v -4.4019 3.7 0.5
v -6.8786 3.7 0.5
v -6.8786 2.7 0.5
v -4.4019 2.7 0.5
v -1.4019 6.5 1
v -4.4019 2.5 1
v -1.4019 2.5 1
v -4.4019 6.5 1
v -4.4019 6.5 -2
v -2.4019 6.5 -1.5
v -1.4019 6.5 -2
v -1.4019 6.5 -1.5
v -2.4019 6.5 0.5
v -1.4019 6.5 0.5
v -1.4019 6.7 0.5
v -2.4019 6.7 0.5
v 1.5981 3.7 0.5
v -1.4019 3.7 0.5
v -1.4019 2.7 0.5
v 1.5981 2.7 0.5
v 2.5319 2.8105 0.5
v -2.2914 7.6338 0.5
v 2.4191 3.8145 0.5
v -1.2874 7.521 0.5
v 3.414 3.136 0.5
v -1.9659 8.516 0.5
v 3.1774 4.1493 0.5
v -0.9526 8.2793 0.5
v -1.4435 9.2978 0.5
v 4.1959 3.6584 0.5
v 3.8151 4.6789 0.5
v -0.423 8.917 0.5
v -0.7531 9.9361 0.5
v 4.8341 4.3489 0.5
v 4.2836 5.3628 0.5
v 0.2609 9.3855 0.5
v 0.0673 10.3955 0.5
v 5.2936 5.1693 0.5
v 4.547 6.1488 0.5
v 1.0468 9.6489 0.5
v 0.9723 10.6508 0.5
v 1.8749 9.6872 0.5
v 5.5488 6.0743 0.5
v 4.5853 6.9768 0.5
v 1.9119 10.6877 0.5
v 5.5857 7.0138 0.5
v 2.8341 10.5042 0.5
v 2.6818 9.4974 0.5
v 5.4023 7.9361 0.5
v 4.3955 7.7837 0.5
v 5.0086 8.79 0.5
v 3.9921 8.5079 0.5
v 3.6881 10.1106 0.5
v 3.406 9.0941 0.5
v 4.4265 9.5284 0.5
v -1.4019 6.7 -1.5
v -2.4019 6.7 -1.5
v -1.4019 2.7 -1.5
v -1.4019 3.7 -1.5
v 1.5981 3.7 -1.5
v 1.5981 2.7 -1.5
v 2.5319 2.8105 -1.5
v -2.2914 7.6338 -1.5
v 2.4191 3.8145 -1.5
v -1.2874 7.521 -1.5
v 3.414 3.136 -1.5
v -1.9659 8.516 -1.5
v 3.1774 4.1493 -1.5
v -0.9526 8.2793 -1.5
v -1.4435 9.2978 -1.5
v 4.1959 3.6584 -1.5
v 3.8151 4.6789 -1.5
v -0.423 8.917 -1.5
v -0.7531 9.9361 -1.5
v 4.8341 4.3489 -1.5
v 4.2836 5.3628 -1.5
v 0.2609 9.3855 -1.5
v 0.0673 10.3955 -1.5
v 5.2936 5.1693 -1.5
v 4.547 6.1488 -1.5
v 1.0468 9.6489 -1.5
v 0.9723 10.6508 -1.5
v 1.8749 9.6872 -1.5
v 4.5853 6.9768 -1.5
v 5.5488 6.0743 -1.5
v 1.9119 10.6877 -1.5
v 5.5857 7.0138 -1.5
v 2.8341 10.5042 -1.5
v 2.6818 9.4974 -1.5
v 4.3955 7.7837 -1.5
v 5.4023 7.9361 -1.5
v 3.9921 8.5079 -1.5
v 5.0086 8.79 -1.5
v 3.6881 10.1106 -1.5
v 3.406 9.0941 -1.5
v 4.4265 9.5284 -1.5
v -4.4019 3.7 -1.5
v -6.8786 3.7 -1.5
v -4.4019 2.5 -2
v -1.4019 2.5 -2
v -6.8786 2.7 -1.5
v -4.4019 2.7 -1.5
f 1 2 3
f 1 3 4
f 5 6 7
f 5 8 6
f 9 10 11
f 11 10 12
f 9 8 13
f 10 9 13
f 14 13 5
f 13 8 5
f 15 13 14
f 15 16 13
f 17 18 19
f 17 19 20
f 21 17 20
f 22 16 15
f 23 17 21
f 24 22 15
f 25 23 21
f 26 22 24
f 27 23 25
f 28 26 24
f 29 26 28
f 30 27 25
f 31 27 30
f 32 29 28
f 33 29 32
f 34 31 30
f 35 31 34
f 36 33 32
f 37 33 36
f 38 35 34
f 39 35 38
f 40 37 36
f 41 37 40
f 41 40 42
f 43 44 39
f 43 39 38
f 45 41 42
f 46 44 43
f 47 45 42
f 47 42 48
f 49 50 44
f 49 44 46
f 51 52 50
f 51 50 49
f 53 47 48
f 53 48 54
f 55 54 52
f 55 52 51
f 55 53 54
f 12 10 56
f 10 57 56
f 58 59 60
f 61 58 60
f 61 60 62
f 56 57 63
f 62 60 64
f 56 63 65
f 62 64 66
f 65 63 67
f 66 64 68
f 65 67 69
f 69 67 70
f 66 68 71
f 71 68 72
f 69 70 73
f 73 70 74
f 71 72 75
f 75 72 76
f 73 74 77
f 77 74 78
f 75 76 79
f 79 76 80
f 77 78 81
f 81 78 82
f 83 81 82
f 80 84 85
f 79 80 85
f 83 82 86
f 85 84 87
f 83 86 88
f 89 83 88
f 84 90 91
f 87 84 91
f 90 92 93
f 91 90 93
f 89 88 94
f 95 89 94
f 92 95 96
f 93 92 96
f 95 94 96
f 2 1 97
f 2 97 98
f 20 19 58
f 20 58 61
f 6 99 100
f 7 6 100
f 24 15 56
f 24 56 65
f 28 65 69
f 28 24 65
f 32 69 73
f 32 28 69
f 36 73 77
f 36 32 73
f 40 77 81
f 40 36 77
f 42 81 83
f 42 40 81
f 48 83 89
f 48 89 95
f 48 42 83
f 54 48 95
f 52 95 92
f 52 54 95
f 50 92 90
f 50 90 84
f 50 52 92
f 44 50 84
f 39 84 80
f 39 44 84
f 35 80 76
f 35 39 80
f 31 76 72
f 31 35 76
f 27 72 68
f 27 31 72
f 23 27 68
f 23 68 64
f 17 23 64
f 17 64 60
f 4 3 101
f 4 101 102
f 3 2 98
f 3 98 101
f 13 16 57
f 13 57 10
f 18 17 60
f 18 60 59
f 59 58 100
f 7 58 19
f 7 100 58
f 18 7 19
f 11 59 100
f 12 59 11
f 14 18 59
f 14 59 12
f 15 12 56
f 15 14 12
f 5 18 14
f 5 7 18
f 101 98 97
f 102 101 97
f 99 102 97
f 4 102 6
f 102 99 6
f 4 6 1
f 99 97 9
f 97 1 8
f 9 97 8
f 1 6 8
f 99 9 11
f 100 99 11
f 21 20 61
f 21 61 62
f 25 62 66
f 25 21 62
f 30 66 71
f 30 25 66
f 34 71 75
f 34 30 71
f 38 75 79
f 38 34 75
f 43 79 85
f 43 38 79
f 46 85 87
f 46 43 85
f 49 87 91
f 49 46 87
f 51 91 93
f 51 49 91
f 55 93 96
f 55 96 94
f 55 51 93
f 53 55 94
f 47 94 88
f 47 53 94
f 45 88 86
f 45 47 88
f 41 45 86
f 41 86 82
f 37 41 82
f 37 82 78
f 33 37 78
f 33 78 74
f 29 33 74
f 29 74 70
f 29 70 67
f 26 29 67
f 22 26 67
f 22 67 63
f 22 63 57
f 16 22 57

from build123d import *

# Parameters (mm, degrees)
SKETCH1_W           = 20
SKETCH1_H           = 20
EXTRUDE1_DEPTH      = 1
SKETCH2_W           = 20
SKETCH2_H           = 20
EXTRUDE2_DEPTH      = 1.5
EXTRUDE2_TAPER      = 75
SKETCH3_W           = 3
SKETCH3_H           = 4
EXTRUDE3_DEPTH      = 2
EXTRUDE_THIN1_DEPTH = 1.5
MOVE_FACE1_BY       = 1
MOVE_FACE1_2_BY     = 1
MOVE_FACE1_3_BY     = 1
SKETCH5_W           = 26.322025843
SKETCH5_H           = 24.141830142
CUT_EXTRUDE1_DEPTH  = 10


with BuildPart() as part:
    # Sketch1 → Extrude1 (new body)
    with BuildSketch(Plane(origin=(0, 0, 0), x_dir=(1, 0, 0), z_dir=(0, 1, 0))):
        Rectangle(SKETCH1_W, SKETCH1_H)
    extrude(amount=EXTRUDE1_DEPTH)

    # Sketch2 → Extrude2 (add)
    with BuildSketch(Plane(origin=(0, 1, 0), x_dir=(-1, 0, 0), z_dir=(0, 1, 0))):
        Rectangle(SKETCH2_W, SKETCH2_H)
    extrude(amount=EXTRUDE2_DEPTH, taper=EXTRUDE2_TAPER)

    # Sketch3 → Extrude3 (add, symmetric)
    with BuildSketch(Plane.XY):
        with Locations((-2.901923789, 4.5)):
            Rectangle(SKETCH3_W, SKETCH3_H)
    extrude(amount=EXTRUDE3_DEPTH, both=True)

    # Sketch4 → Extrude-Thin1 (add, symmetric)
    with BuildSketch(Plane.XY):
        with BuildLine():
            Line((-1.401923789, 6.5), (-1.401923789, 6.7))
            ThreePointArc((-1.401923789, 6.7), (3.719396555, 8.821320344), (1.598076211, 3.7))
            Line((1.598076211, 3.7), (-6.87859684, 3.7))
            Line((-6.87859684, 3.7), (-6.87859684, 2.7))
            Line((-6.87859684, 2.7), (1.598076211, 2.7))
            ThreePointArc((1.598076211, 2.7), (4.426503336, 9.528427125), (-2.401923789, 6.7))
            Line((-2.401923789, 6.7), (-2.401923789, 6.5))
            Line((-2.401923789, 6.5), (-1.401923789, 6.5))
        make_face()
    extrude(amount=EXTRUDE_THIN1_DEPTH, both=True)

    # Move Face1: a face moved inward by 1.0
    extrude(part.faces().sort_by_distance((-2.901923789, 4.5, 2))[0], amount=MOVE_FACE1_BY, dir=(0, 0, -1), mode=Mode.SUBTRACT)

    # Move Face1 2: a face moved inward by 1.0
    extrude(part.faces().sort_by_distance((1.598076211, 3.5, 1.5))[0], amount=MOVE_FACE1_2_BY, dir=(0, 0, -1), mode=Mode.SUBTRACT)

    # Move Face1 3: a face moved inward by 1.0
    extrude(part.faces().sort_by_distance((-5.640260314, 3.2, 1.5))[0], amount=MOVE_FACE1_3_BY, dir=(0, 0, -1), mode=Mode.SUBTRACT)

    # Sketch5 → Cut-Extrude1 (cut)
    with BuildSketch(Plane(origin=(0, 2.5, 0), x_dir=(1, 0, 0), z_dir=(0, 1, 0))):
        with Locations((0.290185678, -1.072850133)):
            Rectangle(SKETCH5_W, SKETCH5_H)
    extrude(amount=-CUT_EXTRUDE1_DEPTH, mode=Mode.SUBTRACT)


solid = part.part
